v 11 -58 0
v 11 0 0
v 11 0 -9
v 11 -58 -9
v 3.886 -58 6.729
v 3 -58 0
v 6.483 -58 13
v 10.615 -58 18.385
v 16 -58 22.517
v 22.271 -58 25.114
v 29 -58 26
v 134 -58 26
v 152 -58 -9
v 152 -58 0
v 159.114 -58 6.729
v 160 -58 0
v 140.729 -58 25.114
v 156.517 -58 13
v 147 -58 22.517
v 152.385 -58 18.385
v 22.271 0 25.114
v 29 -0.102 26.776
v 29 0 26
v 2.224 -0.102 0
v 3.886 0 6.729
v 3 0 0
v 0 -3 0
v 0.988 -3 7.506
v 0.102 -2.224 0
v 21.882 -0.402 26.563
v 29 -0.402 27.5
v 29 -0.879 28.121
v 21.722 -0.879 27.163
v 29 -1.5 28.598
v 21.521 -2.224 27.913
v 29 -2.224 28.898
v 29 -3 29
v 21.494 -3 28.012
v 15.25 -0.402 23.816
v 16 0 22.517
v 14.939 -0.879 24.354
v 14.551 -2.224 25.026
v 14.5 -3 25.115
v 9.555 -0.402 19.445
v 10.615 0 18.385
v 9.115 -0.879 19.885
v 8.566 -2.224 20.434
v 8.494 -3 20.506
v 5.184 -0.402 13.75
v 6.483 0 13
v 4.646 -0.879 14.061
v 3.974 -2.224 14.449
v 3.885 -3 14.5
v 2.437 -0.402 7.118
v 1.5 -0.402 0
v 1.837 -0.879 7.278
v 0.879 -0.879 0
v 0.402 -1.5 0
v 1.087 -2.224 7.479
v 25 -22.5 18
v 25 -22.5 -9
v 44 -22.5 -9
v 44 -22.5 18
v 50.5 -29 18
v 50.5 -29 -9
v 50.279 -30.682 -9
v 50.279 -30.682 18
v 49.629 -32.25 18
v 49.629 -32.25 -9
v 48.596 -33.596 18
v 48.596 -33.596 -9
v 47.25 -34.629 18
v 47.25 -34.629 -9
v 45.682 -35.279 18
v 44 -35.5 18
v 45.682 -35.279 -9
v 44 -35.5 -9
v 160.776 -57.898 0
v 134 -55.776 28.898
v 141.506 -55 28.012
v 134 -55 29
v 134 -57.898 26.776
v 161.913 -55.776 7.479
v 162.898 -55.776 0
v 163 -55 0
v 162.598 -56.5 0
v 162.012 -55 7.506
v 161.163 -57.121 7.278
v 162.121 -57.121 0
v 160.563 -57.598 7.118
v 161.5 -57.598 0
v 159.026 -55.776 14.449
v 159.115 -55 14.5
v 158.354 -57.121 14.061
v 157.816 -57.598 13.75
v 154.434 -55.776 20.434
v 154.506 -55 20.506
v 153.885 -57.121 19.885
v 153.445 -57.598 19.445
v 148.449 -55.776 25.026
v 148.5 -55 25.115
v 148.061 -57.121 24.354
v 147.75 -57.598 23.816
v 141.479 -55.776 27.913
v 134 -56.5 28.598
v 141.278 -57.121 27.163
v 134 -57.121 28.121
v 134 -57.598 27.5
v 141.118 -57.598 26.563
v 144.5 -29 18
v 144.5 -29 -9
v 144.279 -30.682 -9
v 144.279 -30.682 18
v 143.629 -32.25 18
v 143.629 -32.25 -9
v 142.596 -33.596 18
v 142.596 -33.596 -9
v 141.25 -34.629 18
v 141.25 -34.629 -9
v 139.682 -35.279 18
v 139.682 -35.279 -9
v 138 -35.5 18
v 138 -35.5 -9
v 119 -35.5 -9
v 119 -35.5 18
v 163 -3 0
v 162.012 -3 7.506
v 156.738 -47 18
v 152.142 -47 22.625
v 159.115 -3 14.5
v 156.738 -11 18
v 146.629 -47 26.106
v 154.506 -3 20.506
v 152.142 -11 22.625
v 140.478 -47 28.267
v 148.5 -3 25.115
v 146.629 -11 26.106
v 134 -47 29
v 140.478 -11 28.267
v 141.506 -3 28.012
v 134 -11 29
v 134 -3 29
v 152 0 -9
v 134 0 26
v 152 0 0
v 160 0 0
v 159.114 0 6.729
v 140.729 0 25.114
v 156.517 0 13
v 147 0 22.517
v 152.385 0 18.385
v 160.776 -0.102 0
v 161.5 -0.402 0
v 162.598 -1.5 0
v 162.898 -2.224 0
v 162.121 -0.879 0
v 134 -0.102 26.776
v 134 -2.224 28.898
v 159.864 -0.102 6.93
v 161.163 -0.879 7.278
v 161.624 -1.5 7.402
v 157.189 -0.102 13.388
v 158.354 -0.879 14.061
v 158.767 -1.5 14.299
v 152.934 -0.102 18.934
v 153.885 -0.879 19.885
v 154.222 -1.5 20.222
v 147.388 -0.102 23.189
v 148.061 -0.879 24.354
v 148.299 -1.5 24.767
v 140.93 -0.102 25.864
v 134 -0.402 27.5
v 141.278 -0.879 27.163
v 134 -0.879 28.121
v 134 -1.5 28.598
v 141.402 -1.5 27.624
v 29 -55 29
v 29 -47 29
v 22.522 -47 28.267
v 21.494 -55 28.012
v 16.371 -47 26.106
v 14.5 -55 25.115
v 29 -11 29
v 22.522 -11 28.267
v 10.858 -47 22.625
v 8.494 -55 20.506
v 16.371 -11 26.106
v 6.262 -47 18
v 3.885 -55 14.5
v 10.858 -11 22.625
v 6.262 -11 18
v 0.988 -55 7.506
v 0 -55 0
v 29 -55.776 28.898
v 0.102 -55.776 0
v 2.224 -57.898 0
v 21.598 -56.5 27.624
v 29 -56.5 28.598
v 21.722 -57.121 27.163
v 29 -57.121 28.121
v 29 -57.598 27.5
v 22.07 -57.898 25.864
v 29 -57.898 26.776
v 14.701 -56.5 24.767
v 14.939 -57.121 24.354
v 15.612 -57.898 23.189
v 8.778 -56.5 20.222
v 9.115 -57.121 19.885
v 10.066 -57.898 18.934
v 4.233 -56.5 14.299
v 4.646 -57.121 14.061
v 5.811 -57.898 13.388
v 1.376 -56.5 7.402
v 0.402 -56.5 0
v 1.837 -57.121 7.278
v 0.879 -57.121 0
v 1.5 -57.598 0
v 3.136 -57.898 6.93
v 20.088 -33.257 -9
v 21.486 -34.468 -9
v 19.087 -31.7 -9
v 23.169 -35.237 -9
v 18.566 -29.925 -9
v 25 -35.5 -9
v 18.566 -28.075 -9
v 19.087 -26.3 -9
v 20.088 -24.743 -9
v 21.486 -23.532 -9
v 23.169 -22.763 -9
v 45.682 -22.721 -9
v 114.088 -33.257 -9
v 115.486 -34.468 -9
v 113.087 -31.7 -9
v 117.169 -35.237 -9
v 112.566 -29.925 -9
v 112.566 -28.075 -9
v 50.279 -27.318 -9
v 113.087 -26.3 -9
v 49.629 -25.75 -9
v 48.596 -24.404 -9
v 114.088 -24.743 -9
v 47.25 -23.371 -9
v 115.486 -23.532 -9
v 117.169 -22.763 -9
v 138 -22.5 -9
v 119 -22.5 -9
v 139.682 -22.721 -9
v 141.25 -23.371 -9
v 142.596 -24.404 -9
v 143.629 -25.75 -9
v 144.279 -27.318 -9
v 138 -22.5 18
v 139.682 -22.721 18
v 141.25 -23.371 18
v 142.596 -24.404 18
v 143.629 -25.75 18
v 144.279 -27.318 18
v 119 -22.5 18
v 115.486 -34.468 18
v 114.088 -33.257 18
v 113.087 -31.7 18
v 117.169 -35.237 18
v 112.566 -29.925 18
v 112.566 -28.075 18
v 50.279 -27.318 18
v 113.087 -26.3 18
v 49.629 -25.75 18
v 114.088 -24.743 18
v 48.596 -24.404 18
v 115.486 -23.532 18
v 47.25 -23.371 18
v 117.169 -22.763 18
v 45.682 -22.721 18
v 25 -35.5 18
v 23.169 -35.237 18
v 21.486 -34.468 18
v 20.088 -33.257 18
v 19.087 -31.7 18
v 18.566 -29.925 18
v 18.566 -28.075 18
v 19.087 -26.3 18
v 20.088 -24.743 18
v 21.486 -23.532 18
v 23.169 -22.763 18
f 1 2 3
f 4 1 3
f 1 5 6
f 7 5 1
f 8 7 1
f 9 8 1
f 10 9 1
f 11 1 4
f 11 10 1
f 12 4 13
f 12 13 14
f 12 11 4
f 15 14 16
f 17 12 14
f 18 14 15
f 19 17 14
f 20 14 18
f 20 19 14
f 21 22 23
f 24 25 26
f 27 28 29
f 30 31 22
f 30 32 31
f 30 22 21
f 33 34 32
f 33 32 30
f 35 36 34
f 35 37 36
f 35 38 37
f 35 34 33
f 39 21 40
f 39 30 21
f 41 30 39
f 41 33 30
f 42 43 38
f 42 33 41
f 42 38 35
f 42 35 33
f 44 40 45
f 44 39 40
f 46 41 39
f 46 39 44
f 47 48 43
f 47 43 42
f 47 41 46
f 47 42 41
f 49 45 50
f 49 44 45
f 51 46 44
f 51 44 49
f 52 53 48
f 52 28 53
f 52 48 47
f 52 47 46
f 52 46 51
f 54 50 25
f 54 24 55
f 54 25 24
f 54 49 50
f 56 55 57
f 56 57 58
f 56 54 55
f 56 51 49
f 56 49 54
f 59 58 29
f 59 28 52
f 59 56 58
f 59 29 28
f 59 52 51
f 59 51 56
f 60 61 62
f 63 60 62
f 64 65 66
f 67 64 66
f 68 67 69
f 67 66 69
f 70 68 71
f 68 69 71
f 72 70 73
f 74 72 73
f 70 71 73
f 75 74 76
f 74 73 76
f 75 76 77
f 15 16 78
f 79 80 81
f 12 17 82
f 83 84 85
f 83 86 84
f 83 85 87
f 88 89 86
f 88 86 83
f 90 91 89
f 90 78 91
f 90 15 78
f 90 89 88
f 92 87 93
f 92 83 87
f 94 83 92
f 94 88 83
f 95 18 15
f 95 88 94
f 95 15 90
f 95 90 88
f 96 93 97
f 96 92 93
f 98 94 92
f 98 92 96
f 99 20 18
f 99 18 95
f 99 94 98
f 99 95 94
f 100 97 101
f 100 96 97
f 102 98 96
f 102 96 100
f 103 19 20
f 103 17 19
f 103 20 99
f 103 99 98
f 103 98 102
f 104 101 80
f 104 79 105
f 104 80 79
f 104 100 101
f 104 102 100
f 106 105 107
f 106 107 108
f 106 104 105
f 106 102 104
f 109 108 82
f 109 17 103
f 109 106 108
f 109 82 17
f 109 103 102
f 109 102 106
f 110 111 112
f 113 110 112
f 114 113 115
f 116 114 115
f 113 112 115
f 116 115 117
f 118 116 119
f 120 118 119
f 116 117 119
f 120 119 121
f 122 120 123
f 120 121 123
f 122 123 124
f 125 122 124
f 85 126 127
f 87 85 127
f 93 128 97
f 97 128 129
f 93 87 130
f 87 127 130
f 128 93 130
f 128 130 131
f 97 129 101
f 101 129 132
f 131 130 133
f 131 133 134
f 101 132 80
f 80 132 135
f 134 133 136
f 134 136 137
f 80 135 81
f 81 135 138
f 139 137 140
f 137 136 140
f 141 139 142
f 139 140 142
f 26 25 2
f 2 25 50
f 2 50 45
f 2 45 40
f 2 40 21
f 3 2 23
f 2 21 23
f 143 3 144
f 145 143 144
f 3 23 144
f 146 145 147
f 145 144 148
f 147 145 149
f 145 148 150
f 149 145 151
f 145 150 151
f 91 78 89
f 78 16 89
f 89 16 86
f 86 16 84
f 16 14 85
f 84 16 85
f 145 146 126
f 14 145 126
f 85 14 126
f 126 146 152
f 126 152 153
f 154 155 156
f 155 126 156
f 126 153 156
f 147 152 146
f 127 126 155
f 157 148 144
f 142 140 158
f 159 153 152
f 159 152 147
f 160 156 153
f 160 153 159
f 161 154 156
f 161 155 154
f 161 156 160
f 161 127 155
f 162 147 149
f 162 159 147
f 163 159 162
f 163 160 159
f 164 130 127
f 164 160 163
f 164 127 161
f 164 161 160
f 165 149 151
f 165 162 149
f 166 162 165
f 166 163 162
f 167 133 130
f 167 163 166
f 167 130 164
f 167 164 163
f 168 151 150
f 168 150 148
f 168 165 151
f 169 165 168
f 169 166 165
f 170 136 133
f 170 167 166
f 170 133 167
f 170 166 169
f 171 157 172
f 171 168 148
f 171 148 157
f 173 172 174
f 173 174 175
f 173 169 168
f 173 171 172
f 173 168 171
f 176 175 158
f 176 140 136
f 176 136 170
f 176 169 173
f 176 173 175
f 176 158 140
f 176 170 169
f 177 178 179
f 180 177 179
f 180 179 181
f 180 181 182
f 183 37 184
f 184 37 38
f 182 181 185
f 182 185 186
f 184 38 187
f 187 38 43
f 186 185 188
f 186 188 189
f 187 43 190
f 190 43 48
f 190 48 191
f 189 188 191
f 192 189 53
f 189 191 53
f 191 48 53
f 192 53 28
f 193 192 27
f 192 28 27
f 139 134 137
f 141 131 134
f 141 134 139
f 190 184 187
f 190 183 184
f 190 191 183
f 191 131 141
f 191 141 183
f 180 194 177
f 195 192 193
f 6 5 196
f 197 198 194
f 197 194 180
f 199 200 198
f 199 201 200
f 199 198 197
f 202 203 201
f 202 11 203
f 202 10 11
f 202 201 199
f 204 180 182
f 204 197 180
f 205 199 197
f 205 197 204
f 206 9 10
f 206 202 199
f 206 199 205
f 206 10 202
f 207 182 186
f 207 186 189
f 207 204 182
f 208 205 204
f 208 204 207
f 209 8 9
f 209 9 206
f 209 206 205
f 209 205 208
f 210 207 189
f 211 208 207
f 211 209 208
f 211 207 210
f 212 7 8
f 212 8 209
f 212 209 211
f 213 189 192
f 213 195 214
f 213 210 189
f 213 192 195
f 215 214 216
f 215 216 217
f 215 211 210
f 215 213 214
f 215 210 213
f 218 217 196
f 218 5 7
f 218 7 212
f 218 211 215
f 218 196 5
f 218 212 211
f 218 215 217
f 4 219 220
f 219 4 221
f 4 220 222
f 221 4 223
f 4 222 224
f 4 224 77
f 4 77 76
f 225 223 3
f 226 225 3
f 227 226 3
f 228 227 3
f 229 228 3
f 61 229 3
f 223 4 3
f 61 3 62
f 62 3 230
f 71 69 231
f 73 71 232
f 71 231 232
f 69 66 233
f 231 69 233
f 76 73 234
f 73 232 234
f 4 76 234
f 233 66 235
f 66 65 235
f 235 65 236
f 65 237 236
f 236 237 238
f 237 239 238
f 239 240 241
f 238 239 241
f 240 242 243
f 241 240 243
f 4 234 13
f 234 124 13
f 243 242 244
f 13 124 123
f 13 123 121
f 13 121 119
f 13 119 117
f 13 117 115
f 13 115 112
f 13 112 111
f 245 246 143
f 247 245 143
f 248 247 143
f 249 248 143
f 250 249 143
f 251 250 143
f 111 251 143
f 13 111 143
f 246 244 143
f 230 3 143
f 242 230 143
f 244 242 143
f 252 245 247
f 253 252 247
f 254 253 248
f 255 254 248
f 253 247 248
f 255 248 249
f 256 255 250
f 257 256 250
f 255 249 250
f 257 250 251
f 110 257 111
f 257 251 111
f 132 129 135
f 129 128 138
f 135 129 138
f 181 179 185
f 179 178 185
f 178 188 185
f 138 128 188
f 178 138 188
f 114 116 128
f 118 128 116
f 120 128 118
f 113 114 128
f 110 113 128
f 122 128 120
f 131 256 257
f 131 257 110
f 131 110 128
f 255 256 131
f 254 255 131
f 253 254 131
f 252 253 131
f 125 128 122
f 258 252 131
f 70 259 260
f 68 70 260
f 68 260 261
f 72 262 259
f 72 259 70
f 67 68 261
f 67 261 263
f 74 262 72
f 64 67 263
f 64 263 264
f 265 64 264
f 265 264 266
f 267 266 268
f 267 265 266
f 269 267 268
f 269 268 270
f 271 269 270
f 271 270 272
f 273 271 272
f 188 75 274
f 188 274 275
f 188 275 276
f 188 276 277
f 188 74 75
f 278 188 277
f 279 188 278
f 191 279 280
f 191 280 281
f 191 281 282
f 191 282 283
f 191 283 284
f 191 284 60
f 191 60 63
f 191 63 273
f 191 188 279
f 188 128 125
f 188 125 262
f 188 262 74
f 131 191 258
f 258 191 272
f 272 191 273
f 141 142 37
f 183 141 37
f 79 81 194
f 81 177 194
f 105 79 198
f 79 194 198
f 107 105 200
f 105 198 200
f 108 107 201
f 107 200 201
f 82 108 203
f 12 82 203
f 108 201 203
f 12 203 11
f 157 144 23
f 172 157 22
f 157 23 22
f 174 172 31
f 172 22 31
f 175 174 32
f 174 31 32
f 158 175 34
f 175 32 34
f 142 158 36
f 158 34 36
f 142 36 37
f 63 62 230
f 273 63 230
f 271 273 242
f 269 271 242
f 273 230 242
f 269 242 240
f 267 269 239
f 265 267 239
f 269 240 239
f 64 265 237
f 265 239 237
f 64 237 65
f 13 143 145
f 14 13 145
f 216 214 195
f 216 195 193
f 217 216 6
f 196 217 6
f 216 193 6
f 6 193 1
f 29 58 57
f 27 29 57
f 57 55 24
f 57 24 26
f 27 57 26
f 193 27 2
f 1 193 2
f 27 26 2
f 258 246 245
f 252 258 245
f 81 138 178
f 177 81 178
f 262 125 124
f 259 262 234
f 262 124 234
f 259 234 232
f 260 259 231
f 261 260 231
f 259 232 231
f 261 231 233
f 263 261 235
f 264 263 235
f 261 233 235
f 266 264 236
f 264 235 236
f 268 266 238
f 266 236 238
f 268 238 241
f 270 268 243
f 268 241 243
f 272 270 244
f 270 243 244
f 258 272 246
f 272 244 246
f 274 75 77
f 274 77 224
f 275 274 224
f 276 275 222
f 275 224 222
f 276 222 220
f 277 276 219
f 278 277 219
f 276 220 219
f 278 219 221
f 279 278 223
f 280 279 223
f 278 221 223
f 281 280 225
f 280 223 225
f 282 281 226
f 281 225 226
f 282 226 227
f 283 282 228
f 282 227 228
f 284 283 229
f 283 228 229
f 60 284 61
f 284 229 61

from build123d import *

# Parameters (mm, degrees)
F1_DEPTH = 58
F2_W     = 18
F2_H     = 11
F3_DEPTH = 163.001
F4_R     = 3
F6_DEPTH = 38.001


with BuildPart() as f1:
    # F0 (on Front) → F1 (new body)
    with BuildSketch(Plane.XZ):
        with BuildLine():
            Line((134, 29), (29, 29))
            ThreePointArc((29, 29), (8.493903, 20.506097), (0, 0))
            Line((0, 0), (11, 0))
            Line((11, 0), (11, -9))
            Line((11, -9), (152, -9))
            Line((152, -9), (152, 0))
            Line((152, 0), (163, 0))
            ThreePointArc((163, 0), (154.506097, 20.506097), (134, 29))
        make_face()
    extrude(amount=F1_DEPTH)

    # F2 (on Right) → F3 (cut, through all)
    with BuildSketch(Plane.YZ):
        with Locations((-38, 23.5)):
            Rectangle(F2_W, F2_H)
        with Locations((-20, 23.5)):
            Rectangle(F2_W, F2_H)
    extrude(amount=F3_DEPTH, mode=Mode.SUBTRACT)

    # F4
    f4_edges = [f1.edges().sort_by_distance(p)[0] for p in [
        (8.493903, -58, 20.506097),
        (81.5, -58, 29),
        (154.506097, -58, 20.506097),
        (8.493903, 0, 20.506097),
    ]]
    fillet(f4_edges, radius=F4_R)

    # F5 (on face) → F6 (cut, through all)
    with BuildSketch(Plane(origin=(0, 0, -9), x_dir=(1, 0, 0), z_dir=(0, 0, -1))):
        with BuildLine():
            ThreePointArc((138, 22.5), (142.596194, 24.403806), (144.5, 29))
            ThreePointArc((144.5, 29), (142.596194, 33.596194), (138, 35.5))
            ThreePointArc((138, 35.5), (131.5, 29), (138, 22.5))
        make_face()
        with BuildLine():
            ThreePointArc((138, 22.5), (131.5, 29), (138, 35.5))
            Line((138, 35.5), (119, 35.5))
            ThreePointArc((119, 35.5), (123.596194, 33.596194), (125.5, 29))
            ThreePointArc((125.5, 29), (123.596194, 24.403806), (119, 22.5))
            Line((119, 22.5), (138, 22.5))
        make_face()
        with BuildLine():
            ThreePointArc((125.5, 29), (123.596194, 33.596194), (119, 35.5))
            ThreePointArc((119, 35.5), (112.5, 29), (119, 22.5))
            ThreePointArc((119, 22.5), (123.596194, 24.403806), (125.5, 29))
        make_face()
        with BuildLine():
            ThreePointArc((25, 22.5), (29.596194, 24.403806), (31.5, 29))
            ThreePointArc((31.5, 29), (29.596194, 33.596194), (25, 35.5))
            ThreePointArc((25, 35.5), (18.5, 29), (25, 22.5))
        make_face()
        with BuildLine():
            ThreePointArc((25, 35.5), (29.596194, 33.596194), (31.5, 29))
            ThreePointArc((31.5, 29), (29.596194, 24.403806), (25, 22.5))
            Line((25, 22.5), (44, 22.5))
            ThreePointArc((44, 22.5), (37.5, 29), (44, 35.5))
            Line((44, 35.5), (25, 35.5))
        make_face()
        with BuildLine():
            ThreePointArc((50.5, 29), (48.596194, 33.596194), (44, 35.5))
            ThreePointArc((44, 35.5), (37.5, 29), (44, 22.5))
            ThreePointArc((44, 22.5), (48.596194, 24.403806), (50.5, 29))
        make_face()
    extrude(amount=-F6_DEPTH, mode=Mode.SUBTRACT)


solid = f1.part
